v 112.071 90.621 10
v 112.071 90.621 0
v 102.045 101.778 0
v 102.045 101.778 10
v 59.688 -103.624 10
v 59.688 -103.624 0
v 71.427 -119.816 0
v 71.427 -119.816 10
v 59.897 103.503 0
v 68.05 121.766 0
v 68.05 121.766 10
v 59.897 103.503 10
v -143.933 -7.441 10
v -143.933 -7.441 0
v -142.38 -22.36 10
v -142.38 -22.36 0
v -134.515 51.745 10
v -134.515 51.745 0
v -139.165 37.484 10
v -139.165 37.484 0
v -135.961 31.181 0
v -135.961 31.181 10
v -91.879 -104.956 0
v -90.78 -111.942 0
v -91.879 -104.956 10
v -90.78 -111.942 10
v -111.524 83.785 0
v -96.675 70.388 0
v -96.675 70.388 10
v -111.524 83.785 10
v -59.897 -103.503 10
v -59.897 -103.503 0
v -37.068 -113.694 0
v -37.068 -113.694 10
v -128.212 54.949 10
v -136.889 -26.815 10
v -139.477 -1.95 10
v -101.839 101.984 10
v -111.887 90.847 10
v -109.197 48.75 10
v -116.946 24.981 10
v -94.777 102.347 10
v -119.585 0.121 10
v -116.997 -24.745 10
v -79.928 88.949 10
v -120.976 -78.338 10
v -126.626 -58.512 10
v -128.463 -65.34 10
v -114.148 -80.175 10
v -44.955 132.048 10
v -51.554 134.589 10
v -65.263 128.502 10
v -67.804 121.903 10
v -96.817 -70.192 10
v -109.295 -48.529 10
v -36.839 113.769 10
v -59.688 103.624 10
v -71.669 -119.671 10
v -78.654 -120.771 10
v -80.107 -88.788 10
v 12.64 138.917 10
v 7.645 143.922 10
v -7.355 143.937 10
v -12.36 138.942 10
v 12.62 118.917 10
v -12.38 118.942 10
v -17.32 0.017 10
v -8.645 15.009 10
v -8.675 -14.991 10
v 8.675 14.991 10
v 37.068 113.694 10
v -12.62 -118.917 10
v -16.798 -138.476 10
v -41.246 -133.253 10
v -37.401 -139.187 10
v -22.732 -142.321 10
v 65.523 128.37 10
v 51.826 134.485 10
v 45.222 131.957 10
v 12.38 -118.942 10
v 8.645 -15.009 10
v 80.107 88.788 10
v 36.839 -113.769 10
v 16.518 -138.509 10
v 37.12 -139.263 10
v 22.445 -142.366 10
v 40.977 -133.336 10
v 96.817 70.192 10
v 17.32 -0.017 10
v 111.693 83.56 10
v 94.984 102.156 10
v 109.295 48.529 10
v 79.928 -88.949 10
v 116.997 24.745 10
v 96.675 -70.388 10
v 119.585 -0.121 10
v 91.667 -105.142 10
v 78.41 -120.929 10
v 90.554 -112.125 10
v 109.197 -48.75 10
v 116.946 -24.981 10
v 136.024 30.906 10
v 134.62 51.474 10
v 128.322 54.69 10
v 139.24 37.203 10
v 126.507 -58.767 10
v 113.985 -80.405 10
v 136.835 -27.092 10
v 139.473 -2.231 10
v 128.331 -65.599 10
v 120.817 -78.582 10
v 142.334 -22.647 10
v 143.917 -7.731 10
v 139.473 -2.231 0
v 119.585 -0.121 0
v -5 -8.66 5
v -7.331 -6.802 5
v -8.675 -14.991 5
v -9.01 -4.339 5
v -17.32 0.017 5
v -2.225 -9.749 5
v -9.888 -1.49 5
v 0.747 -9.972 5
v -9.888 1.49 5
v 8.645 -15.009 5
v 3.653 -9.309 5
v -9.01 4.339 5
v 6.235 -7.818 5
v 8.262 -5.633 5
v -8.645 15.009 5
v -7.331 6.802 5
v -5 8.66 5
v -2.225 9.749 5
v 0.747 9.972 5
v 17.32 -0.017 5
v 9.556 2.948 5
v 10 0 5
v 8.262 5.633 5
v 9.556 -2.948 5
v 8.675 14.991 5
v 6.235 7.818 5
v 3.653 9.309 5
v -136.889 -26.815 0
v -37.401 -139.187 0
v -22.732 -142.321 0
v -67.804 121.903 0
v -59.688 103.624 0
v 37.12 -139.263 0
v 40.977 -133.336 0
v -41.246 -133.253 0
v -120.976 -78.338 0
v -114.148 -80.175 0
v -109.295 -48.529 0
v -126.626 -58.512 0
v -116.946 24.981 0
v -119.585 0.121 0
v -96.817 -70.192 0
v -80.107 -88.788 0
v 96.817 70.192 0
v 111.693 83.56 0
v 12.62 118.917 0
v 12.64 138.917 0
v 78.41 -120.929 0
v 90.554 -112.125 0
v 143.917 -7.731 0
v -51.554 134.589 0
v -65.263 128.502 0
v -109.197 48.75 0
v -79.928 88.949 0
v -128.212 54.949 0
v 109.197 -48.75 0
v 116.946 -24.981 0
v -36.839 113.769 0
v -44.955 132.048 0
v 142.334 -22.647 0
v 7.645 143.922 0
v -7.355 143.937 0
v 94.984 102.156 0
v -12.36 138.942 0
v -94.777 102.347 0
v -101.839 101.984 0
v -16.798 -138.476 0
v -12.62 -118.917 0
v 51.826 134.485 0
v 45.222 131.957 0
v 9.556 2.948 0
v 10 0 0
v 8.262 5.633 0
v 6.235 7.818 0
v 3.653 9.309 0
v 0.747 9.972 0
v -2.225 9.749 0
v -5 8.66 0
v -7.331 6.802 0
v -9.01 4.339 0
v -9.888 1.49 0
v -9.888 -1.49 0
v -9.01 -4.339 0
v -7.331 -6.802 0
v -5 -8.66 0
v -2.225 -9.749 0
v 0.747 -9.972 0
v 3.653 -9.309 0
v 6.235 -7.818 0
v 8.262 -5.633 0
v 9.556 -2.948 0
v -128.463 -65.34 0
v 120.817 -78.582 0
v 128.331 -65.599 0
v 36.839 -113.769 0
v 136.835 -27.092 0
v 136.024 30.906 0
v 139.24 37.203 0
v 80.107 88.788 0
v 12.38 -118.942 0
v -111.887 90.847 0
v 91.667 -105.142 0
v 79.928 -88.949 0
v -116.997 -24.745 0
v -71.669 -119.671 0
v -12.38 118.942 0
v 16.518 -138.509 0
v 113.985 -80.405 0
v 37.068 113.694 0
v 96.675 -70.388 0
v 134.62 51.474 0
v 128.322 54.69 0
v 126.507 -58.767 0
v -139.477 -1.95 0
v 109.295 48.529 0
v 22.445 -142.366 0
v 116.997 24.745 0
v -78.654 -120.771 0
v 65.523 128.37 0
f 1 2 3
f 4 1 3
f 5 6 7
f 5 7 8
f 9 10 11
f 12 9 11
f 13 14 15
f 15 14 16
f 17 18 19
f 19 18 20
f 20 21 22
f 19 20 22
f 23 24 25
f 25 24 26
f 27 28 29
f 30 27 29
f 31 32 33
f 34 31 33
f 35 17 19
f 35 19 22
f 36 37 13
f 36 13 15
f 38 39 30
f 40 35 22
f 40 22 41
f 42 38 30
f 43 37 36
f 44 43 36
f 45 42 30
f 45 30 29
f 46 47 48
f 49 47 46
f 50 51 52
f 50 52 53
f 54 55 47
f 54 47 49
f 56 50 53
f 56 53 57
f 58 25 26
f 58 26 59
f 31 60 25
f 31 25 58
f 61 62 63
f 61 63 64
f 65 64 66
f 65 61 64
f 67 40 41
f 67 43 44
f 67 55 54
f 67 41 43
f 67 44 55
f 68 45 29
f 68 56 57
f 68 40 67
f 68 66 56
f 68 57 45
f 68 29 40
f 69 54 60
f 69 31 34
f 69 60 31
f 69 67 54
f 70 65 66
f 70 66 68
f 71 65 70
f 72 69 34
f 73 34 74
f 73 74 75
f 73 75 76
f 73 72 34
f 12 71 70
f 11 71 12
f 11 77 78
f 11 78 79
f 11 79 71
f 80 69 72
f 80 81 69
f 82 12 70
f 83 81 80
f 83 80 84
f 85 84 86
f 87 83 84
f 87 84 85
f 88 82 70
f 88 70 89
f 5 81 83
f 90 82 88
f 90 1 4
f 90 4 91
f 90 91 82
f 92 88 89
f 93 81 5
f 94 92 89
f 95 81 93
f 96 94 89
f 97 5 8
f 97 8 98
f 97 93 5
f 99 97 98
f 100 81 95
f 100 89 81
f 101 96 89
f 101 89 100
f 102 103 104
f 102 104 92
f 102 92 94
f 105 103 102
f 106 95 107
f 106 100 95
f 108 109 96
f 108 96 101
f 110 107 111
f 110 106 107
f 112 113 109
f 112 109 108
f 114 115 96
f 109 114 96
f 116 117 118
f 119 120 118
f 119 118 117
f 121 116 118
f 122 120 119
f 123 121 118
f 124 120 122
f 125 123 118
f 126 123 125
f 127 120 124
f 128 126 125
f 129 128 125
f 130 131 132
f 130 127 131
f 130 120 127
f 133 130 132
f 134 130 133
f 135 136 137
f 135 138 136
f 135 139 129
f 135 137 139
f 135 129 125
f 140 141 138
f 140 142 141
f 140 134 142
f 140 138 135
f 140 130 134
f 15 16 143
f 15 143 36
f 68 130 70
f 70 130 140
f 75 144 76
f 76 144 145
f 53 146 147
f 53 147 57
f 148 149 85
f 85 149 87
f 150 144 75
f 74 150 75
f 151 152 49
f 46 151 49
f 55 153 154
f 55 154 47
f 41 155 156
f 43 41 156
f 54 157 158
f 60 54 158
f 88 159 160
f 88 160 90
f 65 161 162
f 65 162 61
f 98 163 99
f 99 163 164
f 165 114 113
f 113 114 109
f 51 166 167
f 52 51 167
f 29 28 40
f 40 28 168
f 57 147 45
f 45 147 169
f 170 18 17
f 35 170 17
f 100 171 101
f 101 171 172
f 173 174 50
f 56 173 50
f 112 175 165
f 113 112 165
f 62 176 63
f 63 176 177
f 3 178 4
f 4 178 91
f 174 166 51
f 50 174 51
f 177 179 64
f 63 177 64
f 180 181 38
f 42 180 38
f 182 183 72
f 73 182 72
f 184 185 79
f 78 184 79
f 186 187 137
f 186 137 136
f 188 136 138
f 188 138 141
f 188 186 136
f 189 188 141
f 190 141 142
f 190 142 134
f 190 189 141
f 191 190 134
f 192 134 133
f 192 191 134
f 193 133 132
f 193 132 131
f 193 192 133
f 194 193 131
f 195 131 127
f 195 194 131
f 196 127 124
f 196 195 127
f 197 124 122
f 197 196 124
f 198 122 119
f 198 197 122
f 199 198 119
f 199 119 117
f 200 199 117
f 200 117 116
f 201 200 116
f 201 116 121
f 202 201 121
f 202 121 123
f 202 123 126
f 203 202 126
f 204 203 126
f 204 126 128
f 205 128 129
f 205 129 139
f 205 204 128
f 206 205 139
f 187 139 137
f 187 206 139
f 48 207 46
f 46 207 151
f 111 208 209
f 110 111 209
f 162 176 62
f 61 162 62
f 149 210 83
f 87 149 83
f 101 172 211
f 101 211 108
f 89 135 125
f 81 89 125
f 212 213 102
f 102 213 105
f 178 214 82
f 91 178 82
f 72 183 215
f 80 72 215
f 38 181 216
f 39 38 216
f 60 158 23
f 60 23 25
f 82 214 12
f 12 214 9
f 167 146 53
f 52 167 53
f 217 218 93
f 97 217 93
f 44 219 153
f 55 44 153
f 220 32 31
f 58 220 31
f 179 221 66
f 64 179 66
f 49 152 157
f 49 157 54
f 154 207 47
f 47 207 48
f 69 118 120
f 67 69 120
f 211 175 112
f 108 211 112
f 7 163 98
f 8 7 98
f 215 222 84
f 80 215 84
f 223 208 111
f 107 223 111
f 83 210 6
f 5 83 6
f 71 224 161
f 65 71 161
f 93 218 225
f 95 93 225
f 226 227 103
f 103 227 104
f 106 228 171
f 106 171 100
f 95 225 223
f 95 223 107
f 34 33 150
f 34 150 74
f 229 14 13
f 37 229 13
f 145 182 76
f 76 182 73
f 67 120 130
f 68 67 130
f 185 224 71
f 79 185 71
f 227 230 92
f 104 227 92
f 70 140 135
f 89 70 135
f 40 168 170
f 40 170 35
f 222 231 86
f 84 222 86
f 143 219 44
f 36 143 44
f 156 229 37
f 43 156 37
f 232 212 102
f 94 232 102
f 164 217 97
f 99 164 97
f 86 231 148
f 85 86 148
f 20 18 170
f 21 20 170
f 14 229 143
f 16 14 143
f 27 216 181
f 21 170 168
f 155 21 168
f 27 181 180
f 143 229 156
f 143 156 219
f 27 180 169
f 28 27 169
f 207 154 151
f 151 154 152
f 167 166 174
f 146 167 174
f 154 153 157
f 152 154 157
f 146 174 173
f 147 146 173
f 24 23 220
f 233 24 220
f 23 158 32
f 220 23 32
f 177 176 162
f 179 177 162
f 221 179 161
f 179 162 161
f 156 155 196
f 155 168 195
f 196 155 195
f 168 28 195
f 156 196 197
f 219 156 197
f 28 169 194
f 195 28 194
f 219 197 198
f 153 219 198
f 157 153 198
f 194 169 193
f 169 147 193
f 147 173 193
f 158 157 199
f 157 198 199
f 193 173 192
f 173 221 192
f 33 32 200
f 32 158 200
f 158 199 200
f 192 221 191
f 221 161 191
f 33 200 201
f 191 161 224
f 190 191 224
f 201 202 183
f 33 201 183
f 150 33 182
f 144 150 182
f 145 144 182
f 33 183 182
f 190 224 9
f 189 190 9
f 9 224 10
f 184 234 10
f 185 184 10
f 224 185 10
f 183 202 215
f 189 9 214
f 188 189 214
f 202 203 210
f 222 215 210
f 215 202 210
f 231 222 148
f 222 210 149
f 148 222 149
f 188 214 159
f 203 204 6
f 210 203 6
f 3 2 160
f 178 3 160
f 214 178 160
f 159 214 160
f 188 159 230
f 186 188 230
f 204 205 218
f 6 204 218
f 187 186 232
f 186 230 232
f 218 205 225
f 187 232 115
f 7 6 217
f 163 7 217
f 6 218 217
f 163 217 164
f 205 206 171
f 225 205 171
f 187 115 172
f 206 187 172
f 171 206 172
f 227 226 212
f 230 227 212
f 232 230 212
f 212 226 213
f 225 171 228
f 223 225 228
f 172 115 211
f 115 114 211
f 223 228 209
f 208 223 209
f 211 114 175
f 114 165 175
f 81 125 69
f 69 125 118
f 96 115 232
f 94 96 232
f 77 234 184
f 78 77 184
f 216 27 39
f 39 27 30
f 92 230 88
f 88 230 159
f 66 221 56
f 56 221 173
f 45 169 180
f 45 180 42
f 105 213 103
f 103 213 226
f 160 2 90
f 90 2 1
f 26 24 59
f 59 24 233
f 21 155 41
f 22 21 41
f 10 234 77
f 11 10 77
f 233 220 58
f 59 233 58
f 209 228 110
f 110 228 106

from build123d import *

# Parameters (mm, degrees)
F1_DEPTH  = 10
F2_DEPTH  = 25
F3_DEPTH  = 25
F4_DEPTH  = 25
F5_DEPTH  = 25
F6_DEPTH  = 25
F7_DEPTH  = 25
F8_DEPTH  = 25
F9_DEPTH  = 25
F10_DEPTH = 25
F11_DEPTH = 25
F12_DEPTH = 25
F13_DEPTH = 25
F14_DEPTH = 25
F15_DEPTH = 25
F16_DEPTH = 25
F17_SIZE  = 5
F0_R      = 10
F18_DEPTH = 5


with BuildPart() as f1:
    # F0 (on Top) → F1 (new body)
    with BuildSketch(Plane.XY):
        Polygon((-96.6750791953, 70.3877321793), (-109.1969291758, 48.7497121768), (-116.9463493664, 24.9810958252), (-119.5846529188, 0.1206857134), (-116.9965333079, -24.7449989432), (-109.2951037797, -48.5292084063), (-96.8169537602, -70.1924585931), (-80.1074382822, -88.7879615186), (-59.8968433531, -103.5030044738), (-37.0684689525, -113.6944694709), (-12.6200245844, -118.9169405856), (12.3799754156, -118.9421707699), (36.8389110842, -113.7690573437), (59.6878095658, -103.6236901871), (79.9280643554, -88.9494705277), (96.6750791953, -70.3877321793), (109.1969291758, -48.7497121768), (116.9463493664, -24.9810958252), (119.5846529188, -0.1206857134), (116.9965333079, 24.7449989432), (109.2951037797, 48.5292084063), (96.8169537602, 70.1924585931), (80.1074382822, 88.7879615186), (59.8968433531, 103.5030044738), (37.0684689525, 113.6944694709), (12.6200245844, 118.9169405856), (-12.3799754156, 118.9421707699), (-36.8389110842, 113.7690573437), (-59.6878095658, 103.6236901871), (-79.9280643554, 88.9494705277), align=None)
        Polygon((-8.6753877305, -14.9912523735), (-17.3204992552, 0.0174799755), (-8.6451115247, 15.008732349), (8.6753877305, 14.9912523735), (17.3204992552, -0.0174799755), (8.6451115247, -15.008732349), align=None, mode=Mode.SUBTRACT)
    extrude(amount=F1_DEPTH)

    # F2 (add): a face of the model
    f2_faces = [f1.faces().sort_by_distance(p)[0] for p in [
        (0.1200245844, 118.9295556778, 5),
    ]]
    extrude(f2_faces, amount=F2_DEPTH)

    # F3 (add): a face of the model
    f3_faces = [f1.faces().sort_by_distance(p)[0] for p in [
        (-48.263360325, 108.6963737654, 5),
    ]]
    extrude(f3_faces, amount=F3_DEPTH)

    # F4 (add): a face of the model
    f4_faces = [f1.faces().sort_by_distance(p)[0] for p in [
        (-88.3015717753, 79.6686013535, 5),
    ]]
    extrude(f4_faces, amount=F4_DEPTH)

    # F5 (add): a face of the model
    f5_faces = [f1.faces().sort_by_distance(p)[0] for p in [
        (-113.0716392711, 36.865404001, 5),
    ]]
    extrude(f5_faces, amount=F5_DEPTH)

    # F6 (add): a face of the model
    f6_faces = [f1.faces().sort_by_distance(p)[0] for p in [
        (-118.2905931133, -12.3121566149, 5),
    ]]
    extrude(f6_faces, amount=F6_DEPTH)

    # F7 (add): a face of the model
    f7_faces = [f1.faces().sort_by_distance(p)[0] for p in [
        (48.4826561528, 108.5987369723, 5),
    ]]
    extrude(f7_faces, amount=F7_DEPTH)

    # F8 (add): a face of the model
    f8_faces = [f1.faces().sort_by_distance(p)[0] for p in [
        (88.4621960212, 79.4902100558, 5),
    ]]
    extrude(f8_faces, amount=F8_DEPTH)

    # F9 (add): a face of the model
    f9_faces = [f1.faces().sort_by_distance(p)[0] for p in [
        (113.1458185438, 36.6371036748, 5),
    ]]
    extrude(f9_faces, amount=F9_DEPTH)

    # F10 (add): a face of the model
    f10_faces = [f1.faces().sort_by_distance(p)[0] for p in [
        (118.2655011426, -12.5508907693, 5),
    ]]
    extrude(f10_faces, amount=F10_DEPTH)

    # F11 (add): a face of the model
    f11_faces = [f1.faces().sort_by_distance(p)[0] for p in [
        (102.9360041856, -59.5687221781, 5),
    ]]
    extrude(f11_faces, amount=F11_DEPTH)

    # F12 (add): a face of the model
    f12_faces = [f1.faces().sort_by_distance(p)[0] for p in [
        (69.8079369606, -96.2865803574, 5),
    ]]
    extrude(f12_faces, amount=F12_DEPTH)

    # F13 (add): a face of the model
    f13_faces = [f1.faces().sort_by_distance(p)[0] for p in [
        (24.6094432499, -116.3556140568, 5),
    ]]
    extrude(f13_faces, amount=F13_DEPTH)

    # F14 (add): a face of the model
    f14_faces = [f1.faces().sort_by_distance(p)[0] for p in [
        (-24.8442467684, -116.3057050283, 5),
    ]]
    extrude(f14_faces, amount=F14_DEPTH)

    # F15 (add): a face of the model
    f15_faces = [f1.faces().sort_by_distance(p)[0] for p in [
        (-70.0021408176, -96.1454829962, 5),
    ]]
    extrude(f15_faces, amount=F15_DEPTH)

    # F16 (add): a face of the model
    f16_faces = [f1.faces().sort_by_distance(p)[0] for p in [
        (-103.05602877, -59.3608334997, 5),
    ]]
    extrude(f16_faces, amount=F16_DEPTH)

    # F17
    f17_edges = [f1.edges().sort_by_distance(p)[0] for p in [
        (144.44505, -2.758988, 5),
        (141.806747, -27.619398, 5),
        (140.780731, 32.446425, 5),
        (133.079301, 56.230634, 5),
        (115.412447, 86.901966, 5),
        (98.702932, 105.497468, 5),
        (70.088303, 126.331367, 5),
        (47.259929, 136.522832, 5),
        (12.645255, 143.916928, 5),
        (-12.354745, 143.942158, 5),
        (-46.984273, 136.617944, 5),
        (-69.833172, 126.472577, 5),
        (42.012022, -138.227981, 5),
        (17.553086, -143.401094, 5),
        (74.362022, -123.863935, 5),
        (94.602277, -109.189715, 5),
        (-98.489793, 105.696477, 5),
        (-74.611879, -123.713589, 5),
        (-17.842493, -143.365373, 5),
        (-42.290937, -138.142901, 5),
        (-118.480193, -82.670602, 5),
        (-141.862205, -27.333117, 5),
        (-140.714954, 32.730512, 5),
        (-144.450325, -2.467433, 5),
        (-130.958343, -61.007352, 5),
        (-132.965533, 56.499128, 5),
        (-115.236808, 87.134738, 5),
        (130.834938, -61.271556, 5),
        (118.313088, -82.909576, 5),
        (-94.822474, -108.998546, 5),
    ]]
    chamfer(f17_edges, length=F17_SIZE)

    # F0 (on Top) → F18 (join)
    with BuildSketch(Plane.XY):
        Polygon((-96.6750791953, 70.3877321793), (-109.1969291758, 48.7497121768), (-116.9463493664, 24.9810958252), (-119.5846529188, 0.1206857134), (-116.9965333079, -24.7449989432), (-109.2951037797, -48.5292084063), (-96.8169537602, -70.1924585931), (-80.1074382822, -88.7879615186), (-59.8968433531, -103.5030044738), (-37.0684689525, -113.6944694709), (-12.6200245844, -118.9169405856), (12.3799754156, -118.9421707699), (36.8389110842, -113.7690573437), (59.6878095658, -103.6236901871), (79.9280643554, -88.9494705277), (96.6750791953, -70.3877321793), (109.1969291758, -48.7497121768), (116.9463493664, -24.9810958252), (119.5846529188, -0.1206857134), (116.9965333079, 24.7449989432), (109.2951037797, 48.5292084063), (96.8169537602, 70.1924585931), (80.1074382822, 88.7879615186), (59.8968433531, 103.5030044738), (37.0684689525, 113.6944694709), (12.6200245844, 118.9169405856), (-12.3799754156, 118.9421707699), (-36.8389110842, 113.7690573437), (-59.6878095658, 103.6236901871), (-79.9280643554, 88.9494705277), align=None)
        Polygon((-8.6753877305, -14.9912523735), (-17.3204992552, 0.0174799755), (-8.6451115247, 15.008732349), (8.6753877305, 14.9912523735), (17.3204992552, -0.0174799755), (8.6451115247, -15.008732349), align=None, mode=Mode.SUBTRACT)
        Polygon((-8.6451115247, 15.008732349), (-17.3204992552, 0.0174799755), (-8.6753877305, -14.9912523735), (8.6451115247, -15.008732349), (17.3204992552, -0.0174799755), (8.6753877305, 14.9912523735), align=None)
        Circle(F0_R, mode=Mode.SUBTRACT)
    extrude(amount=F18_DEPTH)


solid = f1.part
